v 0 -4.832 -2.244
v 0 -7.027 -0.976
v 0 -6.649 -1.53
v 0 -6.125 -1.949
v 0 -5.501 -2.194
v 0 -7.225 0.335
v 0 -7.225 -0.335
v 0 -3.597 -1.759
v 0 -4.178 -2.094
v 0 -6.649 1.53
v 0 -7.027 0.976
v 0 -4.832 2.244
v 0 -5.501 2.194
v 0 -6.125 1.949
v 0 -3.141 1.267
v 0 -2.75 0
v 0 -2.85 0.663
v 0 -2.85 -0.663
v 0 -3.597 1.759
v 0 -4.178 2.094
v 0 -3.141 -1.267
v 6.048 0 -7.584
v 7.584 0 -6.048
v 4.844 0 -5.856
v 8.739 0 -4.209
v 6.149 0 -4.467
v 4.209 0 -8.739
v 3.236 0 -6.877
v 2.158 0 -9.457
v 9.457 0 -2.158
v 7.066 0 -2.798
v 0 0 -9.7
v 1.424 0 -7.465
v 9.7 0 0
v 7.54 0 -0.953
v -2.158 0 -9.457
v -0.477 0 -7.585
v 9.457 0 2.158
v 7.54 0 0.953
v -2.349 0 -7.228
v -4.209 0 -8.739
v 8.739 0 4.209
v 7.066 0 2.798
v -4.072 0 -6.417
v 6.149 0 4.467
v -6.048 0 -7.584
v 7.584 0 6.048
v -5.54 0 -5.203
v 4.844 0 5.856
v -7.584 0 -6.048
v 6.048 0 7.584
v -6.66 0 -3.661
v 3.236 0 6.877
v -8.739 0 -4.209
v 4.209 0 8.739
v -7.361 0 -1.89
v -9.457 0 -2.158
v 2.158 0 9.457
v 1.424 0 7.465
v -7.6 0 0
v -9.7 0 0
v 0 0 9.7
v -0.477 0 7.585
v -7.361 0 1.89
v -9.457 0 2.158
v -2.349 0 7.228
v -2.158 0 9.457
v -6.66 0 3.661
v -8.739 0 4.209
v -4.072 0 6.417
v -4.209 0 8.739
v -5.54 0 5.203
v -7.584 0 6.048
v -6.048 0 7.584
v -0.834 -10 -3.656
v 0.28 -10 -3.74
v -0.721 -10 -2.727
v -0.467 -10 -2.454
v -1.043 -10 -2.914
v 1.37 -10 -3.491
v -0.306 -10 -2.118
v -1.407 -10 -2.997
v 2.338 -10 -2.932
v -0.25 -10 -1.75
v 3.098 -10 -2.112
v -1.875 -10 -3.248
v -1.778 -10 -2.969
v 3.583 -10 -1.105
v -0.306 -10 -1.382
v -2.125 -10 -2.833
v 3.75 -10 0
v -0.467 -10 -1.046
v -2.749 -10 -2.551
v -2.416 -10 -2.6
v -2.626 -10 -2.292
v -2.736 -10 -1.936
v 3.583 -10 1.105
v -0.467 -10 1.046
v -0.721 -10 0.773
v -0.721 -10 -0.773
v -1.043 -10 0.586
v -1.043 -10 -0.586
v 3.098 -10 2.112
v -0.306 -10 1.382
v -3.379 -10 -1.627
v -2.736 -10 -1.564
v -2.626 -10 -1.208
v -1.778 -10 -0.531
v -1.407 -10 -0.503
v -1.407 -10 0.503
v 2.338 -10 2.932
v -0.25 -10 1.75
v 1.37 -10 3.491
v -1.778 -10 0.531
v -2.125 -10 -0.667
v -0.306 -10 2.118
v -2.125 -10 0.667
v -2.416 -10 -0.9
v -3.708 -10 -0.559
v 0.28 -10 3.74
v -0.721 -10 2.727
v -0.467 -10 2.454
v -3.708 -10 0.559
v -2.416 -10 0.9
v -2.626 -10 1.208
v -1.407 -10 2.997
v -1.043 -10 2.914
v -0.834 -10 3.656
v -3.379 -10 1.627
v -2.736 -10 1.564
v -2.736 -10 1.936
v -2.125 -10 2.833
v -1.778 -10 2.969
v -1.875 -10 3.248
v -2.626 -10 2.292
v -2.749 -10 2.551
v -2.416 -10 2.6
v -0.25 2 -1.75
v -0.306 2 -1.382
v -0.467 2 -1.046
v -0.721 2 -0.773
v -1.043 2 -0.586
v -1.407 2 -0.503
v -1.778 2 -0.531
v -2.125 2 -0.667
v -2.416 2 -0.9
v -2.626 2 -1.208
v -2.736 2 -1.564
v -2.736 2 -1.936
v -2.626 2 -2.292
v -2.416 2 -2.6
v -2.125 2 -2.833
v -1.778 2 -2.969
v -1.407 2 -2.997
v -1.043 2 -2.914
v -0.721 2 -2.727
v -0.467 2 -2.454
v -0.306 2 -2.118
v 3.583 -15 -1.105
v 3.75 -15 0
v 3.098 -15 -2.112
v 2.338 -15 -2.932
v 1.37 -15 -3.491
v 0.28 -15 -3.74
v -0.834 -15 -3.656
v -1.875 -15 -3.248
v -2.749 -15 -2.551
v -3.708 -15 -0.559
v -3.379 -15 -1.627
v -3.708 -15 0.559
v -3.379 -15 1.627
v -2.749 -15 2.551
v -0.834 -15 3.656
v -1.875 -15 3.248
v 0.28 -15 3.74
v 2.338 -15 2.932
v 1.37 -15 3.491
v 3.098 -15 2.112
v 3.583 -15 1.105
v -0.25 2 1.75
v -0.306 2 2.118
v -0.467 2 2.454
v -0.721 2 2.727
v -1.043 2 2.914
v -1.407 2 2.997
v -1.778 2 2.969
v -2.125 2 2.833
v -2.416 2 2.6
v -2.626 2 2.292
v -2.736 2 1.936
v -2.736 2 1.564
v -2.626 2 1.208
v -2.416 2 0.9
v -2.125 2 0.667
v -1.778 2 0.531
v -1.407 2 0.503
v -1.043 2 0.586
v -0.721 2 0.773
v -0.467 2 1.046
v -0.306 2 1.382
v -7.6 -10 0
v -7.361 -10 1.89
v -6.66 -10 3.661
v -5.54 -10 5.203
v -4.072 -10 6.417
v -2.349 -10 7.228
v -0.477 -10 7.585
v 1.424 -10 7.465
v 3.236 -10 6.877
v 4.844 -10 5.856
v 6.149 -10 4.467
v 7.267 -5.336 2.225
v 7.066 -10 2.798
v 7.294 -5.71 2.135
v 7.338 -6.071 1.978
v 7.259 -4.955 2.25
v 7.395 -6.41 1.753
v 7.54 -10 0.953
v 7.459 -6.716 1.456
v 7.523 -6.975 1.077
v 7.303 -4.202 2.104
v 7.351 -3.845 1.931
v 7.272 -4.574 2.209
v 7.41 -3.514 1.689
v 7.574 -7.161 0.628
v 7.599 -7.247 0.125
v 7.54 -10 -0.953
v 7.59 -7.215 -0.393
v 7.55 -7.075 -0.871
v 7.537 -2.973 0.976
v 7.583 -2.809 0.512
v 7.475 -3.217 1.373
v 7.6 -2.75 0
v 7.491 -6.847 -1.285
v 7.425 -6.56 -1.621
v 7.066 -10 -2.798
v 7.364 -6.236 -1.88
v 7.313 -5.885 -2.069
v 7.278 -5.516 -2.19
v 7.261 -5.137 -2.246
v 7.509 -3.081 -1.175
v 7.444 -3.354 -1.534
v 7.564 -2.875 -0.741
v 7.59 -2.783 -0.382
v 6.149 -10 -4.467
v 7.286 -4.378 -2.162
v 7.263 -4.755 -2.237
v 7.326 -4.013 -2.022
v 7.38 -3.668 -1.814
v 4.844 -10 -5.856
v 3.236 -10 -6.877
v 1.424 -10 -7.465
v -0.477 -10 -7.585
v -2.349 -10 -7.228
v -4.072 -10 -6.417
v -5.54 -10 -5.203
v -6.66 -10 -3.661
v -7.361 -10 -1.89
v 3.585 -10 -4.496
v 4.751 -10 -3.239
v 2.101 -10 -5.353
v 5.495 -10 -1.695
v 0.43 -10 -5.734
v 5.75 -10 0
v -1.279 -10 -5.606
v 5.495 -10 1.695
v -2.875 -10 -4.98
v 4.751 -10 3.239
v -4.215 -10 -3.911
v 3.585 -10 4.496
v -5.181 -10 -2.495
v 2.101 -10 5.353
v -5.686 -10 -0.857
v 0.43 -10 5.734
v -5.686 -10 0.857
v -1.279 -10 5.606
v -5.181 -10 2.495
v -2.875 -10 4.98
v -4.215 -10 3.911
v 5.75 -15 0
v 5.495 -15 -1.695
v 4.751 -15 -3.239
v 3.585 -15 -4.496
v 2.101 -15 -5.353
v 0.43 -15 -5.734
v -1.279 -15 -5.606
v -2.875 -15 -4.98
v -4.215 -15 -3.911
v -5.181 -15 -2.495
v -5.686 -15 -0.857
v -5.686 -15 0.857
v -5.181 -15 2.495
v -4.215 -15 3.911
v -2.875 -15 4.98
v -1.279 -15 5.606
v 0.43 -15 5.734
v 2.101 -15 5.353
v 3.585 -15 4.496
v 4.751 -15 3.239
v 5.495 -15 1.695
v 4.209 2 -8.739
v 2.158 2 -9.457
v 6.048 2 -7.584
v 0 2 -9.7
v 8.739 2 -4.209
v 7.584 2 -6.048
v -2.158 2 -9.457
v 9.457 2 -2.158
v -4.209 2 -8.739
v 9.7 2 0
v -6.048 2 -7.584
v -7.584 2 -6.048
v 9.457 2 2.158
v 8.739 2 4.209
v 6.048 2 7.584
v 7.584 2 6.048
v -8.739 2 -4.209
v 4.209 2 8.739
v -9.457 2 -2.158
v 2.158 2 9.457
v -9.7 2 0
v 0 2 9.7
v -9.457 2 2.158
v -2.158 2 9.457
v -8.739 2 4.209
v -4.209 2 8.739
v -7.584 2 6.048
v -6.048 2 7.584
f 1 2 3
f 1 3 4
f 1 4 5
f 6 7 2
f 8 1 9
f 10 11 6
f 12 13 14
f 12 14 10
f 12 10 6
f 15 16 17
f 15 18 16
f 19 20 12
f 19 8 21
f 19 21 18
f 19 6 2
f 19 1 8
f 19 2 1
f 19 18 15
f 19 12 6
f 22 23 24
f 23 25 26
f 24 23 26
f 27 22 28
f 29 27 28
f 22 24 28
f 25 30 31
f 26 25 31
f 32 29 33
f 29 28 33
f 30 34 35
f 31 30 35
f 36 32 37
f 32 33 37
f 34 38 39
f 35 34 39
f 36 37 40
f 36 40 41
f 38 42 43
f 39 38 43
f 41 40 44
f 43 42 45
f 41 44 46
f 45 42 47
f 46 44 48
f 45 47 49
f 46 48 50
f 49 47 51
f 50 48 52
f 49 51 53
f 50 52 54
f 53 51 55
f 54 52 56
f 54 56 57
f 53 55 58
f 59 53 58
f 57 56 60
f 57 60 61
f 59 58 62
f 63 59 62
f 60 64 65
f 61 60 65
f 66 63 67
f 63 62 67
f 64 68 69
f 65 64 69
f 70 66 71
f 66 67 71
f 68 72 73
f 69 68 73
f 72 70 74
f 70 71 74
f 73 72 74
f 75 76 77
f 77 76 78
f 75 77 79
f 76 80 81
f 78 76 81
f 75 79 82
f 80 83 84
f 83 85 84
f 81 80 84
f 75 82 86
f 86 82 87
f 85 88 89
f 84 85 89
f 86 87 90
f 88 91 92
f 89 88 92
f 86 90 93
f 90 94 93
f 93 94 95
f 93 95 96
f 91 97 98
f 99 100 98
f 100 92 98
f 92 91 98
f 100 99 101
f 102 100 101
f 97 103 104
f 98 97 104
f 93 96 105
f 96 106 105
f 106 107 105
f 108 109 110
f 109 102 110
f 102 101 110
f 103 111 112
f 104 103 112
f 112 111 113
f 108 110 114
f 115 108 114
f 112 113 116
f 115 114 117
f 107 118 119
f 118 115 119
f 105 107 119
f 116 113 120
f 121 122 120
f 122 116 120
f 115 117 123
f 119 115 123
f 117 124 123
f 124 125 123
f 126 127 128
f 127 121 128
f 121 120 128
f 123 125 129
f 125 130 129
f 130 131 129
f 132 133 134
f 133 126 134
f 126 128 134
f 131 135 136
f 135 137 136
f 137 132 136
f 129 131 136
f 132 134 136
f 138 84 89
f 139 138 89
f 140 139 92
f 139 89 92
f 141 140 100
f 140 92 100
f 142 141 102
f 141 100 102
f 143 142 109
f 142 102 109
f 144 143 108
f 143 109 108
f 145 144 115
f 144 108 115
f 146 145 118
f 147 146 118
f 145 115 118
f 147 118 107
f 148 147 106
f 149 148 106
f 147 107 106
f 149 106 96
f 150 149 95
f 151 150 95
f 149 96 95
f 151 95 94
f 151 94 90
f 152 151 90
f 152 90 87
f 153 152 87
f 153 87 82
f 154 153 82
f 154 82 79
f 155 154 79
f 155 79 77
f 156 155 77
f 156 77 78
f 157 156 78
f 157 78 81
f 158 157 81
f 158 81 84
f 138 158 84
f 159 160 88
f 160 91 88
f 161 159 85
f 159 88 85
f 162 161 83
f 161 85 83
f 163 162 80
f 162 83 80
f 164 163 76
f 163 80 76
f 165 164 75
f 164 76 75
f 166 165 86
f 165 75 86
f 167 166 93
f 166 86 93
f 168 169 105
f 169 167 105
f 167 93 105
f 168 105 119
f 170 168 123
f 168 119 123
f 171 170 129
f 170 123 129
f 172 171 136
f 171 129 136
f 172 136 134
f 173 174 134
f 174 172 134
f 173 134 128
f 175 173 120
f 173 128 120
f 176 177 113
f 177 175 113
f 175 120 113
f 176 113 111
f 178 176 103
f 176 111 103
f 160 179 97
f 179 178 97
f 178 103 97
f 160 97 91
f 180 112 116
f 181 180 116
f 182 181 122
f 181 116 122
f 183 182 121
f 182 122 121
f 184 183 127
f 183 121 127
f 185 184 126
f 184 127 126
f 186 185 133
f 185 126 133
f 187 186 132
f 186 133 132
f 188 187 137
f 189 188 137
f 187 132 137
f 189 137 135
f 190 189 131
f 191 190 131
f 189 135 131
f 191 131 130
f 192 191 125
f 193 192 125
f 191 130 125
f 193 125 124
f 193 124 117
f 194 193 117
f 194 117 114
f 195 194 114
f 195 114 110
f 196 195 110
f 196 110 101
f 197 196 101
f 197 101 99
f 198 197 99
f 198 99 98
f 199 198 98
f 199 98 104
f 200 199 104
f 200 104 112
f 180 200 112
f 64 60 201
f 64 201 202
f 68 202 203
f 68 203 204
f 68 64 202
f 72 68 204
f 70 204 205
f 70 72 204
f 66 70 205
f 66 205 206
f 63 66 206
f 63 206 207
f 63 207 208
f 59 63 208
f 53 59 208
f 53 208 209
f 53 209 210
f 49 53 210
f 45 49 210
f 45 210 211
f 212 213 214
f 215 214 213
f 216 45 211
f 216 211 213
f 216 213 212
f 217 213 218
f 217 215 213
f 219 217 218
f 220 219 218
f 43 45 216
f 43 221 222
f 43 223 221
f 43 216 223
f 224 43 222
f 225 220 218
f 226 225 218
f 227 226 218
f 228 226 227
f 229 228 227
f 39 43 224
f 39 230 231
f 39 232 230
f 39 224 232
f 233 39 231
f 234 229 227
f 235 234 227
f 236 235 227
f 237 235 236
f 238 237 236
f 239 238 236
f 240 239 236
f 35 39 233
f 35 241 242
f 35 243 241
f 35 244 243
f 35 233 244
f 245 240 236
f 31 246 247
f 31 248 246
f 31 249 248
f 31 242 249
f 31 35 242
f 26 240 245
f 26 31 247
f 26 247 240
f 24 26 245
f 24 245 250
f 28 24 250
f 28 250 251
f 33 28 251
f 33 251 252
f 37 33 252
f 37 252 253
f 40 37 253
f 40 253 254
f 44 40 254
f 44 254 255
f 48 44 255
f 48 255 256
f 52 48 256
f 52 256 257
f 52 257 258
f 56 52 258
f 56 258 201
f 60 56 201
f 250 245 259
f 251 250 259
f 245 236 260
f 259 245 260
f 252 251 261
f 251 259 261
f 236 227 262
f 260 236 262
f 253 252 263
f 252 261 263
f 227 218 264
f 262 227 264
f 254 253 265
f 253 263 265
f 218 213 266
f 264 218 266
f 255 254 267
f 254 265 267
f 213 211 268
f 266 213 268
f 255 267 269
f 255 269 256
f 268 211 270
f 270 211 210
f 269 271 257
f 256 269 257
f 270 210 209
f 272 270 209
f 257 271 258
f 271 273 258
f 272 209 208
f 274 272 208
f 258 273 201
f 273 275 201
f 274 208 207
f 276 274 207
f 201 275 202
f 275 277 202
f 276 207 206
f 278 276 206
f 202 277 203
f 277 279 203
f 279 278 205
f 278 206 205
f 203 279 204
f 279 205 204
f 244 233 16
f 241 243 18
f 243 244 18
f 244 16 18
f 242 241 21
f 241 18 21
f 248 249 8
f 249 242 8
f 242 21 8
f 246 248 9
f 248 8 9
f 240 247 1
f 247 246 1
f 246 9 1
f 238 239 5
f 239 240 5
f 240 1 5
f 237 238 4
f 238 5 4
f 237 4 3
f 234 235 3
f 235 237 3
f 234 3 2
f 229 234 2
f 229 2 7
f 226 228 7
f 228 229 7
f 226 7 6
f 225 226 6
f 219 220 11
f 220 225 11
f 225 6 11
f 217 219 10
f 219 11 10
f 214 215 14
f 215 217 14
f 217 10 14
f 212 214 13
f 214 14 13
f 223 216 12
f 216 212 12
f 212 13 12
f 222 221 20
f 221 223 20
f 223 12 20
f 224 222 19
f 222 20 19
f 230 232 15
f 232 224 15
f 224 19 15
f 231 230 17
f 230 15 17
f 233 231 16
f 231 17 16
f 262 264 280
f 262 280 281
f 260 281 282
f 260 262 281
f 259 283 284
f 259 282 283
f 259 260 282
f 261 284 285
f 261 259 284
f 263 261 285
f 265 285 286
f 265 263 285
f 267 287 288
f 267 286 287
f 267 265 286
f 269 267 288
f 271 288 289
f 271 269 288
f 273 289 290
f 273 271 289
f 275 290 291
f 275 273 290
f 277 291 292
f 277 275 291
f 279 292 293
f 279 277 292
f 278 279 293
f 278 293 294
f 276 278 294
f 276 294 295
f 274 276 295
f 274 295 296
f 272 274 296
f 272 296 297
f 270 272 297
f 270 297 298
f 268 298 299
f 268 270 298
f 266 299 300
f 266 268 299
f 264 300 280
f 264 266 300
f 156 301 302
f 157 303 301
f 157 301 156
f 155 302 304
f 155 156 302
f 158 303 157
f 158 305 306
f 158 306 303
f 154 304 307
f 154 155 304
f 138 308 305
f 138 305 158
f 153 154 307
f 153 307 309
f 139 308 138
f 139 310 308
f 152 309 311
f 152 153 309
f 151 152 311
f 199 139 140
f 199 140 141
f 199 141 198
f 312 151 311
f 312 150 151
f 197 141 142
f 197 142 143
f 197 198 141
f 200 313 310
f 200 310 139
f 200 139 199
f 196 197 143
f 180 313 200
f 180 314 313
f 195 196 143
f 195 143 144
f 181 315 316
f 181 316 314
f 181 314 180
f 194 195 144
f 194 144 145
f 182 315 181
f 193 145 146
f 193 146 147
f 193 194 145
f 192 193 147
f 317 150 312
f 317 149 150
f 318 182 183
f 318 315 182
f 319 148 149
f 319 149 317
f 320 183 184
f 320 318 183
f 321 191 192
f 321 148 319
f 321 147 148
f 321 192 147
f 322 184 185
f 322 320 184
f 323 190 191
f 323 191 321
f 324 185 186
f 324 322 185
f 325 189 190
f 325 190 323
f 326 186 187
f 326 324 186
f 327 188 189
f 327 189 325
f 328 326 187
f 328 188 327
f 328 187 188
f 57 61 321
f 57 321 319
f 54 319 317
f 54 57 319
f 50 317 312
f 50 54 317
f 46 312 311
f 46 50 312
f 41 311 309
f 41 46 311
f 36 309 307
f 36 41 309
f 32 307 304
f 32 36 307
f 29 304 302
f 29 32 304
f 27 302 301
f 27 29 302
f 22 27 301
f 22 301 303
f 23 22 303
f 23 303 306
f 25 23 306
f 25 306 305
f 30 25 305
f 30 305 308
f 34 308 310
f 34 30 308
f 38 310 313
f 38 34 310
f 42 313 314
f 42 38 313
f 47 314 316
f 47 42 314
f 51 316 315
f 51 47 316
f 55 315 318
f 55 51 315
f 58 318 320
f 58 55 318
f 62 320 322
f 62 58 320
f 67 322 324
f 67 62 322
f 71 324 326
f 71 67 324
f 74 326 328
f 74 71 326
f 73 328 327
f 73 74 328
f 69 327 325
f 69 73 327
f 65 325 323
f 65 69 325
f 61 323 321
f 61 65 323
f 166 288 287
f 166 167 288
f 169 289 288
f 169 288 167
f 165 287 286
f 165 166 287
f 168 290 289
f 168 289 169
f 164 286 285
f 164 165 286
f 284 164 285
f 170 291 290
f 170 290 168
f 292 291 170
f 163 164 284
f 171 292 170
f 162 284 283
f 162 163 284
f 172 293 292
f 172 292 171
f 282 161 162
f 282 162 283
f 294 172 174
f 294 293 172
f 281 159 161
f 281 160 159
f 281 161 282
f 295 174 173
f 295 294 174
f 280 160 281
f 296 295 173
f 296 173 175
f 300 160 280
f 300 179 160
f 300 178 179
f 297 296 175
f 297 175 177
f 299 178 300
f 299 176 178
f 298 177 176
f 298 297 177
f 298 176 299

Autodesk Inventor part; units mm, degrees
ref_plane "YZ Plane" through (0, 0, 0) normal (1, 0, 0) x (0, 1, 0)
ref_plane "XZ Plane" through (0, 0, 0) normal (0, 1, 0) x (-1, 0, 0)
ref_plane "XY Plane" through (0, 0, 0) normal (0, 0, 1) x (1, 0, 0)
sketch "Sketch1" plane through (0, 0, 0) normal (0, 1, 0) x (-1, 0, 0)
  circle A0 centre (0, 0) radius 7.6
  circle A1 centre (0, 0) radius 9.7
  dimension "d0" = 15.2
  dimension "d1" = 19.4
extrude "Extrusion1" add sketch "Sketch1" along normal blind 2 contours A0 | A1
extrude "Extrusion2" add sketch "Sketch1" against normal blind 10 contours A0
sketch "Sketch2" plane through (0, 0, 0) normal (1, 0, 0) x (0, 1, 0)
  circle A0 centre (-5, 0) radius 2.25
  line L0 (0, -9.7) -> (0, 9.7) projected
  point P0 (0, 0)
  dimension "d6" = 4.5
  dimension "d7" = 5
extrude "Extrusion3" cut sketch "Sketch2" along normal blind 23
sketch "Sketch3" plane through (0, -10, 0) normal (0, -1, 0) x (1, 0, 0)
  circle A0 centre (0, 0) radius 3.75
  circle A1 centre (0, 0) radius 5.75
  dimension "d10" = 7.5
  dimension "d11" = 2
extrude "Extrusion4" add sketch "Sketch3" along normal blind 5
sketch "Sketch6" plane through (0, -10, 0) normal (0, -1, 0) x (1, 0, 0)
  circle A0 centre (0, 0) radius 3.75 projected
  circle A1 centre (-1.5, -1.75) radius 1.25
  circle A2 centre (-1.5, 1.75) radius 1.25
  line L0 (-1.5, -3.4369) -> (-1.5, 3.4369) construction
  line L1 (-1.5, -1.75) -> (-1.5, 1.75)
  point P0 (-1.5, 0)
  dimension "d18" = 2.5
  dimension "d24" = 3.5
  dimension "d25" = 1.5
extrude "Extrusion6" cut sketch "Sketch6" against normal up to next contours A1 | A2
properties part number "button bottom plug"
